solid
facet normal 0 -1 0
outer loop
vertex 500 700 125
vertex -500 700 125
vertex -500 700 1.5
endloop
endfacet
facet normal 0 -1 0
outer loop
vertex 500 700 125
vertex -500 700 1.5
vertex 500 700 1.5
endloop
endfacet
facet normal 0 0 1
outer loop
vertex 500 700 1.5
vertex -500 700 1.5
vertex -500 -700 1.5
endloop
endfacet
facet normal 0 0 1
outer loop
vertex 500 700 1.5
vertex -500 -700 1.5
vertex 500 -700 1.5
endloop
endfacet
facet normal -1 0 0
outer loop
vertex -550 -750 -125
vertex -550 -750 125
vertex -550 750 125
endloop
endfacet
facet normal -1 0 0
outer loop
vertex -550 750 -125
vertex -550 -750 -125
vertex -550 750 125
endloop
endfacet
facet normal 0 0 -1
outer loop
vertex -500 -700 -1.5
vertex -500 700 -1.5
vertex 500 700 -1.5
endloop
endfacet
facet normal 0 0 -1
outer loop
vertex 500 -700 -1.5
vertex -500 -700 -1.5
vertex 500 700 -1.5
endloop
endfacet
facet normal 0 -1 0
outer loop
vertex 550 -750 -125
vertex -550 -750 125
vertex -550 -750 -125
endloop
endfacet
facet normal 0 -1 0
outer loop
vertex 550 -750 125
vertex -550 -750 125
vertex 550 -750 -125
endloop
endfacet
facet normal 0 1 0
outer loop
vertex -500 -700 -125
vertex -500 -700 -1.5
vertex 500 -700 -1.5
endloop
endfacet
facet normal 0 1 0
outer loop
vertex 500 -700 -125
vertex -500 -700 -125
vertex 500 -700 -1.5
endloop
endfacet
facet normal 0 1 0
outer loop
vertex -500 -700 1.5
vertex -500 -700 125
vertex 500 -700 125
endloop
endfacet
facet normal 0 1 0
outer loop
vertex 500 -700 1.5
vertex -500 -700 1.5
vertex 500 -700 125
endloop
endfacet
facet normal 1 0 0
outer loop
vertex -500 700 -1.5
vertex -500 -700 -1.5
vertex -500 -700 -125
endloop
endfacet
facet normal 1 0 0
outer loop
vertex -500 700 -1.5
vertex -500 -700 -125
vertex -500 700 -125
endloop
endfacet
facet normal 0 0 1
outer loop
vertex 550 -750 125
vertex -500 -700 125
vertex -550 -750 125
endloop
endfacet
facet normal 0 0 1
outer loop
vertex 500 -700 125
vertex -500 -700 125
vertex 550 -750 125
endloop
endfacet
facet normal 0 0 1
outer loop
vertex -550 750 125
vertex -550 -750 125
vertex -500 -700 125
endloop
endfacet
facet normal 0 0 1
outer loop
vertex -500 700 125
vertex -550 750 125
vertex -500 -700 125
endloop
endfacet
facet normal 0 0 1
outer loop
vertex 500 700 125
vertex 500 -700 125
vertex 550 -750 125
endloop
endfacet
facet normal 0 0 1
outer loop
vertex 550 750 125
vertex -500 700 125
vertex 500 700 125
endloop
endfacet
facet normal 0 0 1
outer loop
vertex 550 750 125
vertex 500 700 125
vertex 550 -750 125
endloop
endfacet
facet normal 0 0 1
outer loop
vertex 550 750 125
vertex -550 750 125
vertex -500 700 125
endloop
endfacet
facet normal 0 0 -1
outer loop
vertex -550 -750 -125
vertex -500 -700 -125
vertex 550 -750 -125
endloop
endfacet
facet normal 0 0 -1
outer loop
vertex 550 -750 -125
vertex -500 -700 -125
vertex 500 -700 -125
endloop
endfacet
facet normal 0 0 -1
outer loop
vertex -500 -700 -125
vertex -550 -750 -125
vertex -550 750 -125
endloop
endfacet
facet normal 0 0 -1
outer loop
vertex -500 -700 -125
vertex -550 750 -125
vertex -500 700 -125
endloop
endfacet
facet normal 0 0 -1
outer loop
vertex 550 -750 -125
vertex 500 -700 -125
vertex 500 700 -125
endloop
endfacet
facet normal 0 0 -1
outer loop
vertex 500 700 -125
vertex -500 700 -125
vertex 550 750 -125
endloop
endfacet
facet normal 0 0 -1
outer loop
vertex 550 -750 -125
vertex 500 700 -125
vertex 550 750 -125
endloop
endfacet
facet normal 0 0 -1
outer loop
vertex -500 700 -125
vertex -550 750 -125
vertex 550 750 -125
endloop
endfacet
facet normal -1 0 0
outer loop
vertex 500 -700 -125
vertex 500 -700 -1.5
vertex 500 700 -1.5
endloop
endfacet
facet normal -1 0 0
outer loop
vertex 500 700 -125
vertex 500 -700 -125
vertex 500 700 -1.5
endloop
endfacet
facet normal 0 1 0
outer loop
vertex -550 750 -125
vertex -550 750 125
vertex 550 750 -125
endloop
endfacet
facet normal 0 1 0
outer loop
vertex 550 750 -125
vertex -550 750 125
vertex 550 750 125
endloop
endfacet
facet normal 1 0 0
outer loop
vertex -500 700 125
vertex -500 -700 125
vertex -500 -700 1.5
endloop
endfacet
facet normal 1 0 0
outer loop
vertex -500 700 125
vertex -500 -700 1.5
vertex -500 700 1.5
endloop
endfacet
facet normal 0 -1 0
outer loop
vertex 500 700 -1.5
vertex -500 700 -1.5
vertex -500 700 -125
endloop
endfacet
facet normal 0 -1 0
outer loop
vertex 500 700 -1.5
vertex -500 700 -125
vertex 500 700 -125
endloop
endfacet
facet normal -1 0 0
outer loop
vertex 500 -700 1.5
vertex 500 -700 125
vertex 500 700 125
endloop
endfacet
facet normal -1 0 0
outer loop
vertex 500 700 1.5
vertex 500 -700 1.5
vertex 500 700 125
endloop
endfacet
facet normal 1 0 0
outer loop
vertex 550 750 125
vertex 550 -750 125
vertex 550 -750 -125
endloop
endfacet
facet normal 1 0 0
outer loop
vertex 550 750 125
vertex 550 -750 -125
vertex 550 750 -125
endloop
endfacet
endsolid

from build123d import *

# Parameters (mm, degrees)
F0_W     = 1100
F0_H     = 1500
F0_W_2   = 1000
F0_H_2   = 1400
F1_DEPTH = 125
F2_W     = 1000
F2_H     = 1400
F3_DEPTH = 1.5


with BuildPart() as f1:
    # F0 (on Top) → F1 (new body, symmetric)
    with BuildSketch(Plane.XY):
        Rectangle(F0_W, F0_H)
        Rectangle(F0_W_2, F0_H_2, mode=Mode.SUBTRACT)
    extrude(amount=F1_DEPTH, both=True)

    # F2 (on Top) → F3 (join, symmetric)
    with BuildSketch(Plane.XY):
        Rectangle(F2_W, F2_H)
    extrude(amount=F3_DEPTH, both=True)


solid = f1.part
